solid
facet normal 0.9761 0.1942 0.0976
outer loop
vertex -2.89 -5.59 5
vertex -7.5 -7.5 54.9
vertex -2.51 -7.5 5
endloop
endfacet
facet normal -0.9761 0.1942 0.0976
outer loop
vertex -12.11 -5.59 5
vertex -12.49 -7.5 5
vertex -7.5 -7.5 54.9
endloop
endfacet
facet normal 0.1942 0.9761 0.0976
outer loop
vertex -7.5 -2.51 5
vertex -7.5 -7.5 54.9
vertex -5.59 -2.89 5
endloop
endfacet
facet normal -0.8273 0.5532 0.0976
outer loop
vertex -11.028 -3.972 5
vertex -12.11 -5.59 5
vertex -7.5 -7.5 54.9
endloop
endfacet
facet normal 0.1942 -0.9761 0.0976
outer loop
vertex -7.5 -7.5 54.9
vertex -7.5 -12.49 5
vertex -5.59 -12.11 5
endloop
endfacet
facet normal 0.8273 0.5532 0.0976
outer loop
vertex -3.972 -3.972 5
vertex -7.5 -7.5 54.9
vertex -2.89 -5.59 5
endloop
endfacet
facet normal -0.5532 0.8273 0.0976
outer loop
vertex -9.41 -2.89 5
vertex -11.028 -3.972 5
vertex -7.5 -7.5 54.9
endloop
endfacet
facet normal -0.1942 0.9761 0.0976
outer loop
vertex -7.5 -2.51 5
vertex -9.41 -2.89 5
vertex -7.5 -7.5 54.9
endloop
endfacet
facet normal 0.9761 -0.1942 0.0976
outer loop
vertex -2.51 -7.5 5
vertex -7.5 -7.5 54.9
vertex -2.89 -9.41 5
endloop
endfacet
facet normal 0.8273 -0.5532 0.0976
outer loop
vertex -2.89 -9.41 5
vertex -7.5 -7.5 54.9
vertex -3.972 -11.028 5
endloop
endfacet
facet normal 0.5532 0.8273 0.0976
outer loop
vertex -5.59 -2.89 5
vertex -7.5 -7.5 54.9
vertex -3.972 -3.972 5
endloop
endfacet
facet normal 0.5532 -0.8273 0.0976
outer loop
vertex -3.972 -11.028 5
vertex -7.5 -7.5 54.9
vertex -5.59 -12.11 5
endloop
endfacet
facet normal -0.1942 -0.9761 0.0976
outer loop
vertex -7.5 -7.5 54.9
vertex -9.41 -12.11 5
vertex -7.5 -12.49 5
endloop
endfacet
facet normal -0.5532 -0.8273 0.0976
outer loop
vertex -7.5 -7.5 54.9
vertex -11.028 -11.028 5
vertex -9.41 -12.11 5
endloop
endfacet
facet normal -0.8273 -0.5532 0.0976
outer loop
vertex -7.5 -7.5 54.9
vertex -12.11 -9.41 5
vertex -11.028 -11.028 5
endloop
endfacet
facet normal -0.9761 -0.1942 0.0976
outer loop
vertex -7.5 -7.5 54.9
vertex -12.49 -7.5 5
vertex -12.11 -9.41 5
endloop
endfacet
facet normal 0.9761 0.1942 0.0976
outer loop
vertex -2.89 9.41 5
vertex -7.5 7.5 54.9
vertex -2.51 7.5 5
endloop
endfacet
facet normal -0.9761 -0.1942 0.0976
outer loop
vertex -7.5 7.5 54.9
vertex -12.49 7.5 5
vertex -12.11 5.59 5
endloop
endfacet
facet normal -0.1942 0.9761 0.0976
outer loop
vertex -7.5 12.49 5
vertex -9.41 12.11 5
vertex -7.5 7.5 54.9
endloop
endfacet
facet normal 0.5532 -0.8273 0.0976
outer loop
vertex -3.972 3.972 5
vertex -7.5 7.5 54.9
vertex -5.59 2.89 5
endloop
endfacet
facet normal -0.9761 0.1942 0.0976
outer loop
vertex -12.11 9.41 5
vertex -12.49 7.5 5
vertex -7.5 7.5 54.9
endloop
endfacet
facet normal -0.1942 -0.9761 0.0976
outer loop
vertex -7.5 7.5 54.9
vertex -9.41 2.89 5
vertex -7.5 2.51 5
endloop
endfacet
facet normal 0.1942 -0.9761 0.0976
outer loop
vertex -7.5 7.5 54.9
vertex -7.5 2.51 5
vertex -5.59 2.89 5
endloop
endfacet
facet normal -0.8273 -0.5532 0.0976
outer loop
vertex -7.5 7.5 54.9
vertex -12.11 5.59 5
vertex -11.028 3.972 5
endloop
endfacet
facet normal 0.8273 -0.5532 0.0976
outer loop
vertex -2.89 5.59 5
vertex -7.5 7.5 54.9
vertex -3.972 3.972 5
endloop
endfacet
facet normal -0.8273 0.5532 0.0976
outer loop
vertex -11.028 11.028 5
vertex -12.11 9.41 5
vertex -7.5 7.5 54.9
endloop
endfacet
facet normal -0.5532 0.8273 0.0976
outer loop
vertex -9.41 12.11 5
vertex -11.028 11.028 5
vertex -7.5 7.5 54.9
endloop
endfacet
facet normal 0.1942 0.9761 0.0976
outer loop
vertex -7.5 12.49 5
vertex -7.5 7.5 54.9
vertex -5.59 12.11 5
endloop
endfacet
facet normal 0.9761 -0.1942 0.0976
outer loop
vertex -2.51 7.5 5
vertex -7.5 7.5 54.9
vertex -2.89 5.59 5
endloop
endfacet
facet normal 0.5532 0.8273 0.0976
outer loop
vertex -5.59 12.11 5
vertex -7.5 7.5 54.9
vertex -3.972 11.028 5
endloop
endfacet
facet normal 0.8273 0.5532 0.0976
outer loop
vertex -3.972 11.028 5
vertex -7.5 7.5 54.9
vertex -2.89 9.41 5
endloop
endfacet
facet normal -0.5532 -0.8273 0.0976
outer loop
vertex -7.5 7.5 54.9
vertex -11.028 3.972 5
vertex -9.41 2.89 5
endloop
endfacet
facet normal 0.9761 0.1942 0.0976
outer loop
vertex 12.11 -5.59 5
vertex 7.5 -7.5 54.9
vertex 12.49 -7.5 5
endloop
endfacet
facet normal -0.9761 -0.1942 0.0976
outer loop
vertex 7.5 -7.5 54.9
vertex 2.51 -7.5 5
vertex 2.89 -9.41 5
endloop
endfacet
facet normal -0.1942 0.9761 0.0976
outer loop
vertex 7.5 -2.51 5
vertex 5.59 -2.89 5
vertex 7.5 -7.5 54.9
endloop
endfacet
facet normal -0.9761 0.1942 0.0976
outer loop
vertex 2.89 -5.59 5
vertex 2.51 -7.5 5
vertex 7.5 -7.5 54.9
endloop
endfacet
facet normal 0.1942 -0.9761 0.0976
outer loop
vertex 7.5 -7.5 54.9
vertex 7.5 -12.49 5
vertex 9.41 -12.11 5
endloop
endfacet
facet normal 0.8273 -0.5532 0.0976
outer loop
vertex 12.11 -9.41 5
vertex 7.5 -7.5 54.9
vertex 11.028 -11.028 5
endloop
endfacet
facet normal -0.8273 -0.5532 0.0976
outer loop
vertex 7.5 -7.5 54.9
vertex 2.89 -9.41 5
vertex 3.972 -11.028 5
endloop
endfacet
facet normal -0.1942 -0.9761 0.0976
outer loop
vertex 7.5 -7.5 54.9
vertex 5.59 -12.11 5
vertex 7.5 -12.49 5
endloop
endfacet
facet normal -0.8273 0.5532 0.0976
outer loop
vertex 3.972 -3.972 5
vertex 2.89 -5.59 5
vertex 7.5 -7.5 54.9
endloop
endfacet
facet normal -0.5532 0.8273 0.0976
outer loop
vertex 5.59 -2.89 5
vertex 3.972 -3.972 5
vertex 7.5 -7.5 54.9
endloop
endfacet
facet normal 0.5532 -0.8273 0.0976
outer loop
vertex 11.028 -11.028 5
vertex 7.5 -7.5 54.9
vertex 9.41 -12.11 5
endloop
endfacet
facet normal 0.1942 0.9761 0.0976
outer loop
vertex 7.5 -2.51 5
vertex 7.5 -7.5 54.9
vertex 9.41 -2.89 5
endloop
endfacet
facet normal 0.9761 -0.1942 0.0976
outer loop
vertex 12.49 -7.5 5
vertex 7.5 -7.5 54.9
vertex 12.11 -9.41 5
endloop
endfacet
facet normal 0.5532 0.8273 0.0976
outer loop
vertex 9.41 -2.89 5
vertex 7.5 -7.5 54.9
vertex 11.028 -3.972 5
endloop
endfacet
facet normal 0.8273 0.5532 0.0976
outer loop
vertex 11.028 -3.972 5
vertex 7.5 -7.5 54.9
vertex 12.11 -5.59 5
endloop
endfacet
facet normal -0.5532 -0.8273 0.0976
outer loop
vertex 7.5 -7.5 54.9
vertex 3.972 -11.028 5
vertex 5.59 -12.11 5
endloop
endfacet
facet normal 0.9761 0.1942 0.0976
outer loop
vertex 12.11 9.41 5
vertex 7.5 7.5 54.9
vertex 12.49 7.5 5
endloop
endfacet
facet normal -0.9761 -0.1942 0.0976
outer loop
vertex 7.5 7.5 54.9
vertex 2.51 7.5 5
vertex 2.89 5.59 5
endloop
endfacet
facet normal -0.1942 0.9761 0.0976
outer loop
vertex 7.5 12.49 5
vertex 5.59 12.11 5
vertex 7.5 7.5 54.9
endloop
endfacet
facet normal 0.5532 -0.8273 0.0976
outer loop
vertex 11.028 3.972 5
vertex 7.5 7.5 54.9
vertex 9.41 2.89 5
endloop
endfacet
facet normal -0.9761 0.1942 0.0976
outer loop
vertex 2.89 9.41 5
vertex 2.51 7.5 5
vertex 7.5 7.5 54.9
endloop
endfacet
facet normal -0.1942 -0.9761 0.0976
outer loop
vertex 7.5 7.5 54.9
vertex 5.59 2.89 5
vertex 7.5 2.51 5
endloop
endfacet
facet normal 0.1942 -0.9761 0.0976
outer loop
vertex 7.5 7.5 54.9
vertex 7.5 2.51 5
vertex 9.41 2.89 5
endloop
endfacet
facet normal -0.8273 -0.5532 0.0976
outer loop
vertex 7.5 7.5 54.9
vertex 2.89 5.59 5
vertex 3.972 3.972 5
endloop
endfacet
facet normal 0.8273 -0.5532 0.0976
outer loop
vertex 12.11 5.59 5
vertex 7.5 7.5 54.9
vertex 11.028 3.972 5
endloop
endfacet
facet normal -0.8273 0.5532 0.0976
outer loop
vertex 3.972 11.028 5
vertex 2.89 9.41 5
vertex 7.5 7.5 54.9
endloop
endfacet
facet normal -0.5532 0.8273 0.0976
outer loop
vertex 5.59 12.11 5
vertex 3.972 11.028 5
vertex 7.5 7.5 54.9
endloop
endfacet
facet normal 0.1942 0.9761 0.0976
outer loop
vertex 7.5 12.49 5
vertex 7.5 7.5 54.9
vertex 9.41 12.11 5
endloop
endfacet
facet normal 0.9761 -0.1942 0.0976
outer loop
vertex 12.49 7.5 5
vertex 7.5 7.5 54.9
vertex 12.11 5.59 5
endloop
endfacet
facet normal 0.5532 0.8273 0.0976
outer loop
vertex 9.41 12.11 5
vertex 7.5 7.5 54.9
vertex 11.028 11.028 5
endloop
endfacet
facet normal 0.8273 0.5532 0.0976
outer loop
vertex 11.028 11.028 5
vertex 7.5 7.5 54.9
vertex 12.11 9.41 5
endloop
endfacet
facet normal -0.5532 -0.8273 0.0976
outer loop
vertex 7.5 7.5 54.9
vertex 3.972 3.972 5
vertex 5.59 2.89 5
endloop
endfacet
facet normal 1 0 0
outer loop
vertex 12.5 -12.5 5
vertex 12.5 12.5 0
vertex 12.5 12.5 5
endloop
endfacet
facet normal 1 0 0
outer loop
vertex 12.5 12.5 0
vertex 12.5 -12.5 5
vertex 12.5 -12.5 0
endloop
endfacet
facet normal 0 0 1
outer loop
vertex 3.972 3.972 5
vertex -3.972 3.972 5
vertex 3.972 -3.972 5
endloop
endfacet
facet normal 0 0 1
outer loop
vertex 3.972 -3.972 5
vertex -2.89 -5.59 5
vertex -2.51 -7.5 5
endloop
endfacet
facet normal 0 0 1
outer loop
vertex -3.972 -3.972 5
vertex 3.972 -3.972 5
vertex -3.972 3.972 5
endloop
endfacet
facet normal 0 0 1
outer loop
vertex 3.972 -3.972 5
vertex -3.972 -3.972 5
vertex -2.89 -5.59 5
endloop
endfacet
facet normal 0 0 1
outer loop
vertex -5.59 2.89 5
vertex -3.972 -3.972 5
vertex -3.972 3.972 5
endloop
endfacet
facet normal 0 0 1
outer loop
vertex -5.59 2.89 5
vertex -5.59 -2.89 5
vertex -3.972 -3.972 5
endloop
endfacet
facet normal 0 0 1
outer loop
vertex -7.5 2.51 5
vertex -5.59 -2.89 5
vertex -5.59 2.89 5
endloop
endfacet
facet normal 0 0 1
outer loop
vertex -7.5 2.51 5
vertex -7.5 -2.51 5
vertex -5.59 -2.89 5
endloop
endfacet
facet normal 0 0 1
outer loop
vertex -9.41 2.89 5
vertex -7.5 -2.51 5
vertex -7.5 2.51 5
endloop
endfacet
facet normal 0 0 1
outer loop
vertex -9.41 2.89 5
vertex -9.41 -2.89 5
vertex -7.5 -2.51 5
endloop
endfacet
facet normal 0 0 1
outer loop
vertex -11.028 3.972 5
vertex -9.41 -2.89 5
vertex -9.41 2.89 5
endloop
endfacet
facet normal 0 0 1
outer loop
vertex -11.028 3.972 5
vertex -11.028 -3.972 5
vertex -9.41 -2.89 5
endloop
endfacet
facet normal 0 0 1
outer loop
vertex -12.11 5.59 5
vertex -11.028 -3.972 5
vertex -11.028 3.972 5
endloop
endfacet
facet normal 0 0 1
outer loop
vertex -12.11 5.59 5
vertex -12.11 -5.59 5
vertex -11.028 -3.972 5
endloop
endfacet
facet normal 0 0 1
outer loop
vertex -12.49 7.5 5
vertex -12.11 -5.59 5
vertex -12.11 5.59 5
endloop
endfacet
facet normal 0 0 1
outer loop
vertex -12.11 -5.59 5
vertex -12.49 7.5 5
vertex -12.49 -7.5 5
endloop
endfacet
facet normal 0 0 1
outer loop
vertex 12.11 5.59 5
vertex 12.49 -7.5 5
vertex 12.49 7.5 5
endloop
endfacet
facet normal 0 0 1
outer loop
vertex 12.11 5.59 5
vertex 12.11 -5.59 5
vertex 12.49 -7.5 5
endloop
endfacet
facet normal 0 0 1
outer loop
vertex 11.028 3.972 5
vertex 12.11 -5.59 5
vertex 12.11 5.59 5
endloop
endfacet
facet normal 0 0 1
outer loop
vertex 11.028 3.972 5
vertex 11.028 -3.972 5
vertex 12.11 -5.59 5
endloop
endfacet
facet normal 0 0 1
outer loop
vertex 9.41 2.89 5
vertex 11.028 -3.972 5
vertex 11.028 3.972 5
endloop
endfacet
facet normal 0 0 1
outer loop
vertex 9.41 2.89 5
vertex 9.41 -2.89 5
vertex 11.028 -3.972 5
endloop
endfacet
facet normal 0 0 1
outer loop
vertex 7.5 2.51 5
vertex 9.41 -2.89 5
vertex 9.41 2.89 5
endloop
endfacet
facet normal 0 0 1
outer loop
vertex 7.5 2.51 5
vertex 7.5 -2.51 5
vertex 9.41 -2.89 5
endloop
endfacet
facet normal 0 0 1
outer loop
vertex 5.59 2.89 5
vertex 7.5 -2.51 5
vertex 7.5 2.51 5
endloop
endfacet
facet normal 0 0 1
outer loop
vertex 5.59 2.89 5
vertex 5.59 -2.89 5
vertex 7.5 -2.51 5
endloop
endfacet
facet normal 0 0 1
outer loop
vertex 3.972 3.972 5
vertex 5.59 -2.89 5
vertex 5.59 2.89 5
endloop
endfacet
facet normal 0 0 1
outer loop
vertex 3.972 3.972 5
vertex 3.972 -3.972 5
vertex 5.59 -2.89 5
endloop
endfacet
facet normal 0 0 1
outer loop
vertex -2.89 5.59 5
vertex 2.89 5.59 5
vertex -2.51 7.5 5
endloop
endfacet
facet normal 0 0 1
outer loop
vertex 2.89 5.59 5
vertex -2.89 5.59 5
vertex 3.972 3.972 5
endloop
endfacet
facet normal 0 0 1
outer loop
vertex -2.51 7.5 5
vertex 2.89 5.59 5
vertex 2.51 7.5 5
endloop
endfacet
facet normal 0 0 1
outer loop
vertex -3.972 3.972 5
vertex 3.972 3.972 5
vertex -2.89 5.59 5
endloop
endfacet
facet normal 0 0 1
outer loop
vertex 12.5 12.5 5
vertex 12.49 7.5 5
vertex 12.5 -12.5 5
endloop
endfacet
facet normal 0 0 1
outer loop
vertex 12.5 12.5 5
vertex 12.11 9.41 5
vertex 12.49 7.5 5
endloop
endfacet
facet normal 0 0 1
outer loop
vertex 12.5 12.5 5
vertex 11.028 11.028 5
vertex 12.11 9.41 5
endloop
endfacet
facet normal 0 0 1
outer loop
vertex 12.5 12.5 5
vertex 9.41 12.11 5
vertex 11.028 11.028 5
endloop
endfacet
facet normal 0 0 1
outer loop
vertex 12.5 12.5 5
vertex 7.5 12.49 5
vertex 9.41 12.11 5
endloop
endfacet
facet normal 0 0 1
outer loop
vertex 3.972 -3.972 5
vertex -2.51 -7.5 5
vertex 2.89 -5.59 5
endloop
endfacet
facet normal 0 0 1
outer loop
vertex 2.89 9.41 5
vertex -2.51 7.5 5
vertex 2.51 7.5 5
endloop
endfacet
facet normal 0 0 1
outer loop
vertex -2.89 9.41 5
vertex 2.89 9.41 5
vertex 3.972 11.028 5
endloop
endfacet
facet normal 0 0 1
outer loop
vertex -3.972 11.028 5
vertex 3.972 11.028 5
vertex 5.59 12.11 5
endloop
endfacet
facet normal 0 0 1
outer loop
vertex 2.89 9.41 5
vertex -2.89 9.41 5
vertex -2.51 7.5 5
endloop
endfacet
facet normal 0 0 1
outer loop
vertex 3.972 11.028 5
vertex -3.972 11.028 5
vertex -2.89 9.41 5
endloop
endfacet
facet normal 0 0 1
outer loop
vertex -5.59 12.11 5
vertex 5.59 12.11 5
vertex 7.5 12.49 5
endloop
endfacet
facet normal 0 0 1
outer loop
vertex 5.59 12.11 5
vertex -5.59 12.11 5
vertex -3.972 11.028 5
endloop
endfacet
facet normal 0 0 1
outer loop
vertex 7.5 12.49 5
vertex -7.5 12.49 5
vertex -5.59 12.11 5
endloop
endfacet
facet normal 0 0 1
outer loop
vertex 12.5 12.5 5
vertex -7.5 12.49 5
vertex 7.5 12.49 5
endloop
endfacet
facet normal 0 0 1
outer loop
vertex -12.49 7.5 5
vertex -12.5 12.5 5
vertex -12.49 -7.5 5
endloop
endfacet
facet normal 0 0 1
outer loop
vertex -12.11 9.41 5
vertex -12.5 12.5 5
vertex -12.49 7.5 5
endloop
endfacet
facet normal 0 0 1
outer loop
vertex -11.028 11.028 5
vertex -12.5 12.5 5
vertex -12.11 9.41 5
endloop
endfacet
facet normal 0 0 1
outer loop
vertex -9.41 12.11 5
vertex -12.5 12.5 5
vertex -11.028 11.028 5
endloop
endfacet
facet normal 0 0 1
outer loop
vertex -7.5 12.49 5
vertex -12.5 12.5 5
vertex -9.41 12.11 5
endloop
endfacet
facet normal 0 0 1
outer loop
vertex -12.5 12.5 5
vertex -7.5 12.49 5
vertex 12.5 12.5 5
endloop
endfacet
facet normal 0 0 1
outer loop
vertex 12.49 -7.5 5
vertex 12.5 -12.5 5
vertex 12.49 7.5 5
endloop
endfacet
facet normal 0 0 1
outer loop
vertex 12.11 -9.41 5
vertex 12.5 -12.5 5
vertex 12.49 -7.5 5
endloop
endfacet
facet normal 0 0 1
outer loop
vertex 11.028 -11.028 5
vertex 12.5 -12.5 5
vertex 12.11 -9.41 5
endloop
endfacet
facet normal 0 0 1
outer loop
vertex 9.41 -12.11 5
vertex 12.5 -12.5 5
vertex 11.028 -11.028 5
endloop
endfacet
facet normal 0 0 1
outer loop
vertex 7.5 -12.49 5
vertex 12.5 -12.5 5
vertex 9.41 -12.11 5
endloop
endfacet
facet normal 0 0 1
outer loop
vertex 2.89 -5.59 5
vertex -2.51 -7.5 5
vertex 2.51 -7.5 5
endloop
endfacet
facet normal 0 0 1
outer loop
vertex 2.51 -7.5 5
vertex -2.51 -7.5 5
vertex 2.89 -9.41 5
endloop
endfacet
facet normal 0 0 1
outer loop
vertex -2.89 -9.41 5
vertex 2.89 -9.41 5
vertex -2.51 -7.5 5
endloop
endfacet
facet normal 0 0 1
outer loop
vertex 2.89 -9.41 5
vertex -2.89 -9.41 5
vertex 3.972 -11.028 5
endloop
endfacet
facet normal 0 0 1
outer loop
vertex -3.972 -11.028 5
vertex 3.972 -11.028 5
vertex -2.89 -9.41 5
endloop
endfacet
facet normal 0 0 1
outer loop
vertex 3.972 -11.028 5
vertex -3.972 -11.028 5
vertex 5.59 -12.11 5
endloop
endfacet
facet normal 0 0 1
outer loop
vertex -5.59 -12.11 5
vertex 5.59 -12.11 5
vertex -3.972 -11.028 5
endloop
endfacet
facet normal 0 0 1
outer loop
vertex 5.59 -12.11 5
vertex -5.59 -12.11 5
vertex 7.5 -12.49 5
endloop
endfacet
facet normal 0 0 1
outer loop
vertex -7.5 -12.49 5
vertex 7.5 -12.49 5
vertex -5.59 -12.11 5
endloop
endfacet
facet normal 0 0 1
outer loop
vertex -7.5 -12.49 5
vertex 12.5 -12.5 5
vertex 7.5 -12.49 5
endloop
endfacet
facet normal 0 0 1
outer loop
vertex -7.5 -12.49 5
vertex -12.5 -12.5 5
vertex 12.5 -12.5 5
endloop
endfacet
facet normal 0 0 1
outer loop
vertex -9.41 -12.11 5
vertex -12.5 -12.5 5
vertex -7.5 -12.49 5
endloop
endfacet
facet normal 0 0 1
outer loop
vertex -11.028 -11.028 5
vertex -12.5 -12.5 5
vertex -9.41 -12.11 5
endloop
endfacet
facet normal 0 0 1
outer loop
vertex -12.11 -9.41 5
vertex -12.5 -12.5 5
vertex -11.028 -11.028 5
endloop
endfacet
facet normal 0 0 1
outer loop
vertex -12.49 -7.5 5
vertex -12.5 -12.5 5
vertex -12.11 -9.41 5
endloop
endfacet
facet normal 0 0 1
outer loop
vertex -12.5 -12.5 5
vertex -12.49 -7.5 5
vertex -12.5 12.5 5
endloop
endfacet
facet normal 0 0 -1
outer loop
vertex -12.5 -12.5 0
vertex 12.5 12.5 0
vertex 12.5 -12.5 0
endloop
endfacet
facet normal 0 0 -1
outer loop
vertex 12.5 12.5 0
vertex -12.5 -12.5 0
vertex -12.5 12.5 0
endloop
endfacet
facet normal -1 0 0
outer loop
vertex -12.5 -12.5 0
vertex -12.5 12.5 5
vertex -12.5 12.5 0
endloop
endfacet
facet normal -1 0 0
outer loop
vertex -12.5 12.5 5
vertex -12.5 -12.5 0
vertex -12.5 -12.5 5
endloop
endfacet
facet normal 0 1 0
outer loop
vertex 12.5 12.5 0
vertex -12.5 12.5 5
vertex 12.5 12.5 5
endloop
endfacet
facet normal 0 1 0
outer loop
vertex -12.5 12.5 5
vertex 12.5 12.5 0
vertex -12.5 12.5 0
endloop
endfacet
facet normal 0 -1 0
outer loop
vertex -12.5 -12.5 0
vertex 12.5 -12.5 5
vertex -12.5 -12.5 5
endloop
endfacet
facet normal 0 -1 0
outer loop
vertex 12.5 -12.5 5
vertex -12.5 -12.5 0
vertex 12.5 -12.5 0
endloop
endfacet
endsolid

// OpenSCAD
height = 50;
radius = 5;
count = 1;

base_height = 5;
base_side = count * 15 + radius * 2;

translate([-base_side/2, -base_side/2, 0])
union() {
cube([base_side, base_side, base_height]);

translate([radius, radius, 0])
for(i = [0:count]) {
  for(j = [0:count]) {
    translate([i * 15, j * 15, base_height - 0.1])
    cylinder(h=height, r1=radius, r2=0);
  }
}
}
